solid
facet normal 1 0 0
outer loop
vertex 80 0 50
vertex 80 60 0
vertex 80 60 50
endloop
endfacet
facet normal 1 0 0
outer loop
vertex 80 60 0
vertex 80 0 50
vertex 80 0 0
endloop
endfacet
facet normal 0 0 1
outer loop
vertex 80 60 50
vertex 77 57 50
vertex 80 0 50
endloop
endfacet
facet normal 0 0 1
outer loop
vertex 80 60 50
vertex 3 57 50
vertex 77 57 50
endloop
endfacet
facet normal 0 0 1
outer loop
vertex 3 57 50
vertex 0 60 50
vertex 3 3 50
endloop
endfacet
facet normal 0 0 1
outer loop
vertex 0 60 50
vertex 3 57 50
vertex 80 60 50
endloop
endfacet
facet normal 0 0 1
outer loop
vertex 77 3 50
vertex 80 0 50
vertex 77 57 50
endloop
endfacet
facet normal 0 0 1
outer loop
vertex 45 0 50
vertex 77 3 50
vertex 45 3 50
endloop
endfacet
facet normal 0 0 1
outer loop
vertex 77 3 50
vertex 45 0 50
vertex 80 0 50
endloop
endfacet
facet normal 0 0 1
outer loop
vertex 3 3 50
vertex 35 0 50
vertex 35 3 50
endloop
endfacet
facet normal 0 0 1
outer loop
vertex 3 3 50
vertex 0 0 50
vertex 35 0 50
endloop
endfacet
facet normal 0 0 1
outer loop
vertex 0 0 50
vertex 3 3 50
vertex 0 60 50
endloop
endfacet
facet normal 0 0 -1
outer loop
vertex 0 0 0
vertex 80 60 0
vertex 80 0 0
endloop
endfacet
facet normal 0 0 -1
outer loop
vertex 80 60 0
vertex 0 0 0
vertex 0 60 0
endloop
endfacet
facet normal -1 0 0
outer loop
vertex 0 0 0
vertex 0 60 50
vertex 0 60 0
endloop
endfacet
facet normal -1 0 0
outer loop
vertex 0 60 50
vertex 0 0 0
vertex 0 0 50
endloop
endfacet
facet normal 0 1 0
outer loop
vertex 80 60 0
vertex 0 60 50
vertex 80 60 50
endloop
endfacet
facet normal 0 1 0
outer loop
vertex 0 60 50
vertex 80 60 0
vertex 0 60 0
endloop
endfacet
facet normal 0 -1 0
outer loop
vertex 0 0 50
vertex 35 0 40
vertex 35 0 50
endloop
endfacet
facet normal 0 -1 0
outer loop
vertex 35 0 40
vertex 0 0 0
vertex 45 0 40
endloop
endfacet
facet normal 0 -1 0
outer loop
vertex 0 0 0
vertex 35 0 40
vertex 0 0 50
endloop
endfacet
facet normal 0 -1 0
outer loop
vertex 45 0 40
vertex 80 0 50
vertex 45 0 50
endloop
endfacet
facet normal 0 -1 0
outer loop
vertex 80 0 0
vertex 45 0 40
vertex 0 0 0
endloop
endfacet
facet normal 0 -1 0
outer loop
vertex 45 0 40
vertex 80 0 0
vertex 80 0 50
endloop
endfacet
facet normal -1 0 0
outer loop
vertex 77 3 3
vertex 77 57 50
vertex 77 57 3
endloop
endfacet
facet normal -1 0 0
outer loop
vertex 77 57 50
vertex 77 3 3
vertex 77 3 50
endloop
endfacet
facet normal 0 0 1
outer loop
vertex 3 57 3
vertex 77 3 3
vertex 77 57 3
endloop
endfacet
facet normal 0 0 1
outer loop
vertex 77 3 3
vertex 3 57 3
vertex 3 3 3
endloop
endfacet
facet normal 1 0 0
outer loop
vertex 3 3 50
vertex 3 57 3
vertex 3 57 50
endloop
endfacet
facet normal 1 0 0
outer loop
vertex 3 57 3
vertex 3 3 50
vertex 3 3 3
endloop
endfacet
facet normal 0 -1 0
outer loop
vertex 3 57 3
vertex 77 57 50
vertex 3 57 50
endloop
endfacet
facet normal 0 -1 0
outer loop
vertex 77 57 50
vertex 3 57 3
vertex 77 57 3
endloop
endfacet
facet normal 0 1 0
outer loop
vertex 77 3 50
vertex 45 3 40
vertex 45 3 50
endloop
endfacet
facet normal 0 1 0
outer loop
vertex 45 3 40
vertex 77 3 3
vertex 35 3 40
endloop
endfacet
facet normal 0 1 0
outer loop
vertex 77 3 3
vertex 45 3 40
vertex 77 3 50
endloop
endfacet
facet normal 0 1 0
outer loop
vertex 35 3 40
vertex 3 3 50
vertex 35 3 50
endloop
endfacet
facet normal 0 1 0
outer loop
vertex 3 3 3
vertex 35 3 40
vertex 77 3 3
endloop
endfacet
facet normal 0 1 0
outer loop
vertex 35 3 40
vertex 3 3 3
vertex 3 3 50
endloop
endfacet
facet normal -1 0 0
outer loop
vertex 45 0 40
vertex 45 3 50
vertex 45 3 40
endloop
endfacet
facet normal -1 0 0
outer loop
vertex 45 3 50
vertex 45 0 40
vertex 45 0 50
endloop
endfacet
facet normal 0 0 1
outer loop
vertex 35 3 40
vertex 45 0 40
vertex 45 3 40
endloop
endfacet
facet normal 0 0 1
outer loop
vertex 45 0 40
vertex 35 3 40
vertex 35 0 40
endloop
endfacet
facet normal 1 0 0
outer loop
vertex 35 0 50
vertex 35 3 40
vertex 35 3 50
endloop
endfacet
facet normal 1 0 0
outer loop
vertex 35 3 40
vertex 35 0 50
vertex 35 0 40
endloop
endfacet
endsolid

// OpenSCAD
$fn = 32;

// ----------------------------------------------------------------------
// Enclosure box: notch enclosure
// ----------------------------------------------------------------------

// --- parameters (mm) ---
box_l = 80;               // outer length, X
box_w = 60;               // outer width, Y
box_h = 50;               // outer height
wall_t = 3;               // wall thickness
notch_w = 10;             // cable notch width
notch_h = 10;             // cable notch height
fit_tol = 0.1;            // tolerance for press fits, mm
free_tol = 0.3;           // tolerance for clearance fits, mm

inner_h = box_h - wall_t;  // cavity depth
boss_h = inner_h - 2;  // corner boss height

difference() {
  cube([box_l, box_w, box_h]);
  translate([wall_t, wall_t, wall_t])
    cube([box_l - 2 * wall_t, box_w - 2 * wall_t, box_h]);
  translate([box_l / 2 - notch_w / 2, -1, box_h - notch_h])
    cube([notch_w, wall_t + 2, notch_h + 1]);
}
